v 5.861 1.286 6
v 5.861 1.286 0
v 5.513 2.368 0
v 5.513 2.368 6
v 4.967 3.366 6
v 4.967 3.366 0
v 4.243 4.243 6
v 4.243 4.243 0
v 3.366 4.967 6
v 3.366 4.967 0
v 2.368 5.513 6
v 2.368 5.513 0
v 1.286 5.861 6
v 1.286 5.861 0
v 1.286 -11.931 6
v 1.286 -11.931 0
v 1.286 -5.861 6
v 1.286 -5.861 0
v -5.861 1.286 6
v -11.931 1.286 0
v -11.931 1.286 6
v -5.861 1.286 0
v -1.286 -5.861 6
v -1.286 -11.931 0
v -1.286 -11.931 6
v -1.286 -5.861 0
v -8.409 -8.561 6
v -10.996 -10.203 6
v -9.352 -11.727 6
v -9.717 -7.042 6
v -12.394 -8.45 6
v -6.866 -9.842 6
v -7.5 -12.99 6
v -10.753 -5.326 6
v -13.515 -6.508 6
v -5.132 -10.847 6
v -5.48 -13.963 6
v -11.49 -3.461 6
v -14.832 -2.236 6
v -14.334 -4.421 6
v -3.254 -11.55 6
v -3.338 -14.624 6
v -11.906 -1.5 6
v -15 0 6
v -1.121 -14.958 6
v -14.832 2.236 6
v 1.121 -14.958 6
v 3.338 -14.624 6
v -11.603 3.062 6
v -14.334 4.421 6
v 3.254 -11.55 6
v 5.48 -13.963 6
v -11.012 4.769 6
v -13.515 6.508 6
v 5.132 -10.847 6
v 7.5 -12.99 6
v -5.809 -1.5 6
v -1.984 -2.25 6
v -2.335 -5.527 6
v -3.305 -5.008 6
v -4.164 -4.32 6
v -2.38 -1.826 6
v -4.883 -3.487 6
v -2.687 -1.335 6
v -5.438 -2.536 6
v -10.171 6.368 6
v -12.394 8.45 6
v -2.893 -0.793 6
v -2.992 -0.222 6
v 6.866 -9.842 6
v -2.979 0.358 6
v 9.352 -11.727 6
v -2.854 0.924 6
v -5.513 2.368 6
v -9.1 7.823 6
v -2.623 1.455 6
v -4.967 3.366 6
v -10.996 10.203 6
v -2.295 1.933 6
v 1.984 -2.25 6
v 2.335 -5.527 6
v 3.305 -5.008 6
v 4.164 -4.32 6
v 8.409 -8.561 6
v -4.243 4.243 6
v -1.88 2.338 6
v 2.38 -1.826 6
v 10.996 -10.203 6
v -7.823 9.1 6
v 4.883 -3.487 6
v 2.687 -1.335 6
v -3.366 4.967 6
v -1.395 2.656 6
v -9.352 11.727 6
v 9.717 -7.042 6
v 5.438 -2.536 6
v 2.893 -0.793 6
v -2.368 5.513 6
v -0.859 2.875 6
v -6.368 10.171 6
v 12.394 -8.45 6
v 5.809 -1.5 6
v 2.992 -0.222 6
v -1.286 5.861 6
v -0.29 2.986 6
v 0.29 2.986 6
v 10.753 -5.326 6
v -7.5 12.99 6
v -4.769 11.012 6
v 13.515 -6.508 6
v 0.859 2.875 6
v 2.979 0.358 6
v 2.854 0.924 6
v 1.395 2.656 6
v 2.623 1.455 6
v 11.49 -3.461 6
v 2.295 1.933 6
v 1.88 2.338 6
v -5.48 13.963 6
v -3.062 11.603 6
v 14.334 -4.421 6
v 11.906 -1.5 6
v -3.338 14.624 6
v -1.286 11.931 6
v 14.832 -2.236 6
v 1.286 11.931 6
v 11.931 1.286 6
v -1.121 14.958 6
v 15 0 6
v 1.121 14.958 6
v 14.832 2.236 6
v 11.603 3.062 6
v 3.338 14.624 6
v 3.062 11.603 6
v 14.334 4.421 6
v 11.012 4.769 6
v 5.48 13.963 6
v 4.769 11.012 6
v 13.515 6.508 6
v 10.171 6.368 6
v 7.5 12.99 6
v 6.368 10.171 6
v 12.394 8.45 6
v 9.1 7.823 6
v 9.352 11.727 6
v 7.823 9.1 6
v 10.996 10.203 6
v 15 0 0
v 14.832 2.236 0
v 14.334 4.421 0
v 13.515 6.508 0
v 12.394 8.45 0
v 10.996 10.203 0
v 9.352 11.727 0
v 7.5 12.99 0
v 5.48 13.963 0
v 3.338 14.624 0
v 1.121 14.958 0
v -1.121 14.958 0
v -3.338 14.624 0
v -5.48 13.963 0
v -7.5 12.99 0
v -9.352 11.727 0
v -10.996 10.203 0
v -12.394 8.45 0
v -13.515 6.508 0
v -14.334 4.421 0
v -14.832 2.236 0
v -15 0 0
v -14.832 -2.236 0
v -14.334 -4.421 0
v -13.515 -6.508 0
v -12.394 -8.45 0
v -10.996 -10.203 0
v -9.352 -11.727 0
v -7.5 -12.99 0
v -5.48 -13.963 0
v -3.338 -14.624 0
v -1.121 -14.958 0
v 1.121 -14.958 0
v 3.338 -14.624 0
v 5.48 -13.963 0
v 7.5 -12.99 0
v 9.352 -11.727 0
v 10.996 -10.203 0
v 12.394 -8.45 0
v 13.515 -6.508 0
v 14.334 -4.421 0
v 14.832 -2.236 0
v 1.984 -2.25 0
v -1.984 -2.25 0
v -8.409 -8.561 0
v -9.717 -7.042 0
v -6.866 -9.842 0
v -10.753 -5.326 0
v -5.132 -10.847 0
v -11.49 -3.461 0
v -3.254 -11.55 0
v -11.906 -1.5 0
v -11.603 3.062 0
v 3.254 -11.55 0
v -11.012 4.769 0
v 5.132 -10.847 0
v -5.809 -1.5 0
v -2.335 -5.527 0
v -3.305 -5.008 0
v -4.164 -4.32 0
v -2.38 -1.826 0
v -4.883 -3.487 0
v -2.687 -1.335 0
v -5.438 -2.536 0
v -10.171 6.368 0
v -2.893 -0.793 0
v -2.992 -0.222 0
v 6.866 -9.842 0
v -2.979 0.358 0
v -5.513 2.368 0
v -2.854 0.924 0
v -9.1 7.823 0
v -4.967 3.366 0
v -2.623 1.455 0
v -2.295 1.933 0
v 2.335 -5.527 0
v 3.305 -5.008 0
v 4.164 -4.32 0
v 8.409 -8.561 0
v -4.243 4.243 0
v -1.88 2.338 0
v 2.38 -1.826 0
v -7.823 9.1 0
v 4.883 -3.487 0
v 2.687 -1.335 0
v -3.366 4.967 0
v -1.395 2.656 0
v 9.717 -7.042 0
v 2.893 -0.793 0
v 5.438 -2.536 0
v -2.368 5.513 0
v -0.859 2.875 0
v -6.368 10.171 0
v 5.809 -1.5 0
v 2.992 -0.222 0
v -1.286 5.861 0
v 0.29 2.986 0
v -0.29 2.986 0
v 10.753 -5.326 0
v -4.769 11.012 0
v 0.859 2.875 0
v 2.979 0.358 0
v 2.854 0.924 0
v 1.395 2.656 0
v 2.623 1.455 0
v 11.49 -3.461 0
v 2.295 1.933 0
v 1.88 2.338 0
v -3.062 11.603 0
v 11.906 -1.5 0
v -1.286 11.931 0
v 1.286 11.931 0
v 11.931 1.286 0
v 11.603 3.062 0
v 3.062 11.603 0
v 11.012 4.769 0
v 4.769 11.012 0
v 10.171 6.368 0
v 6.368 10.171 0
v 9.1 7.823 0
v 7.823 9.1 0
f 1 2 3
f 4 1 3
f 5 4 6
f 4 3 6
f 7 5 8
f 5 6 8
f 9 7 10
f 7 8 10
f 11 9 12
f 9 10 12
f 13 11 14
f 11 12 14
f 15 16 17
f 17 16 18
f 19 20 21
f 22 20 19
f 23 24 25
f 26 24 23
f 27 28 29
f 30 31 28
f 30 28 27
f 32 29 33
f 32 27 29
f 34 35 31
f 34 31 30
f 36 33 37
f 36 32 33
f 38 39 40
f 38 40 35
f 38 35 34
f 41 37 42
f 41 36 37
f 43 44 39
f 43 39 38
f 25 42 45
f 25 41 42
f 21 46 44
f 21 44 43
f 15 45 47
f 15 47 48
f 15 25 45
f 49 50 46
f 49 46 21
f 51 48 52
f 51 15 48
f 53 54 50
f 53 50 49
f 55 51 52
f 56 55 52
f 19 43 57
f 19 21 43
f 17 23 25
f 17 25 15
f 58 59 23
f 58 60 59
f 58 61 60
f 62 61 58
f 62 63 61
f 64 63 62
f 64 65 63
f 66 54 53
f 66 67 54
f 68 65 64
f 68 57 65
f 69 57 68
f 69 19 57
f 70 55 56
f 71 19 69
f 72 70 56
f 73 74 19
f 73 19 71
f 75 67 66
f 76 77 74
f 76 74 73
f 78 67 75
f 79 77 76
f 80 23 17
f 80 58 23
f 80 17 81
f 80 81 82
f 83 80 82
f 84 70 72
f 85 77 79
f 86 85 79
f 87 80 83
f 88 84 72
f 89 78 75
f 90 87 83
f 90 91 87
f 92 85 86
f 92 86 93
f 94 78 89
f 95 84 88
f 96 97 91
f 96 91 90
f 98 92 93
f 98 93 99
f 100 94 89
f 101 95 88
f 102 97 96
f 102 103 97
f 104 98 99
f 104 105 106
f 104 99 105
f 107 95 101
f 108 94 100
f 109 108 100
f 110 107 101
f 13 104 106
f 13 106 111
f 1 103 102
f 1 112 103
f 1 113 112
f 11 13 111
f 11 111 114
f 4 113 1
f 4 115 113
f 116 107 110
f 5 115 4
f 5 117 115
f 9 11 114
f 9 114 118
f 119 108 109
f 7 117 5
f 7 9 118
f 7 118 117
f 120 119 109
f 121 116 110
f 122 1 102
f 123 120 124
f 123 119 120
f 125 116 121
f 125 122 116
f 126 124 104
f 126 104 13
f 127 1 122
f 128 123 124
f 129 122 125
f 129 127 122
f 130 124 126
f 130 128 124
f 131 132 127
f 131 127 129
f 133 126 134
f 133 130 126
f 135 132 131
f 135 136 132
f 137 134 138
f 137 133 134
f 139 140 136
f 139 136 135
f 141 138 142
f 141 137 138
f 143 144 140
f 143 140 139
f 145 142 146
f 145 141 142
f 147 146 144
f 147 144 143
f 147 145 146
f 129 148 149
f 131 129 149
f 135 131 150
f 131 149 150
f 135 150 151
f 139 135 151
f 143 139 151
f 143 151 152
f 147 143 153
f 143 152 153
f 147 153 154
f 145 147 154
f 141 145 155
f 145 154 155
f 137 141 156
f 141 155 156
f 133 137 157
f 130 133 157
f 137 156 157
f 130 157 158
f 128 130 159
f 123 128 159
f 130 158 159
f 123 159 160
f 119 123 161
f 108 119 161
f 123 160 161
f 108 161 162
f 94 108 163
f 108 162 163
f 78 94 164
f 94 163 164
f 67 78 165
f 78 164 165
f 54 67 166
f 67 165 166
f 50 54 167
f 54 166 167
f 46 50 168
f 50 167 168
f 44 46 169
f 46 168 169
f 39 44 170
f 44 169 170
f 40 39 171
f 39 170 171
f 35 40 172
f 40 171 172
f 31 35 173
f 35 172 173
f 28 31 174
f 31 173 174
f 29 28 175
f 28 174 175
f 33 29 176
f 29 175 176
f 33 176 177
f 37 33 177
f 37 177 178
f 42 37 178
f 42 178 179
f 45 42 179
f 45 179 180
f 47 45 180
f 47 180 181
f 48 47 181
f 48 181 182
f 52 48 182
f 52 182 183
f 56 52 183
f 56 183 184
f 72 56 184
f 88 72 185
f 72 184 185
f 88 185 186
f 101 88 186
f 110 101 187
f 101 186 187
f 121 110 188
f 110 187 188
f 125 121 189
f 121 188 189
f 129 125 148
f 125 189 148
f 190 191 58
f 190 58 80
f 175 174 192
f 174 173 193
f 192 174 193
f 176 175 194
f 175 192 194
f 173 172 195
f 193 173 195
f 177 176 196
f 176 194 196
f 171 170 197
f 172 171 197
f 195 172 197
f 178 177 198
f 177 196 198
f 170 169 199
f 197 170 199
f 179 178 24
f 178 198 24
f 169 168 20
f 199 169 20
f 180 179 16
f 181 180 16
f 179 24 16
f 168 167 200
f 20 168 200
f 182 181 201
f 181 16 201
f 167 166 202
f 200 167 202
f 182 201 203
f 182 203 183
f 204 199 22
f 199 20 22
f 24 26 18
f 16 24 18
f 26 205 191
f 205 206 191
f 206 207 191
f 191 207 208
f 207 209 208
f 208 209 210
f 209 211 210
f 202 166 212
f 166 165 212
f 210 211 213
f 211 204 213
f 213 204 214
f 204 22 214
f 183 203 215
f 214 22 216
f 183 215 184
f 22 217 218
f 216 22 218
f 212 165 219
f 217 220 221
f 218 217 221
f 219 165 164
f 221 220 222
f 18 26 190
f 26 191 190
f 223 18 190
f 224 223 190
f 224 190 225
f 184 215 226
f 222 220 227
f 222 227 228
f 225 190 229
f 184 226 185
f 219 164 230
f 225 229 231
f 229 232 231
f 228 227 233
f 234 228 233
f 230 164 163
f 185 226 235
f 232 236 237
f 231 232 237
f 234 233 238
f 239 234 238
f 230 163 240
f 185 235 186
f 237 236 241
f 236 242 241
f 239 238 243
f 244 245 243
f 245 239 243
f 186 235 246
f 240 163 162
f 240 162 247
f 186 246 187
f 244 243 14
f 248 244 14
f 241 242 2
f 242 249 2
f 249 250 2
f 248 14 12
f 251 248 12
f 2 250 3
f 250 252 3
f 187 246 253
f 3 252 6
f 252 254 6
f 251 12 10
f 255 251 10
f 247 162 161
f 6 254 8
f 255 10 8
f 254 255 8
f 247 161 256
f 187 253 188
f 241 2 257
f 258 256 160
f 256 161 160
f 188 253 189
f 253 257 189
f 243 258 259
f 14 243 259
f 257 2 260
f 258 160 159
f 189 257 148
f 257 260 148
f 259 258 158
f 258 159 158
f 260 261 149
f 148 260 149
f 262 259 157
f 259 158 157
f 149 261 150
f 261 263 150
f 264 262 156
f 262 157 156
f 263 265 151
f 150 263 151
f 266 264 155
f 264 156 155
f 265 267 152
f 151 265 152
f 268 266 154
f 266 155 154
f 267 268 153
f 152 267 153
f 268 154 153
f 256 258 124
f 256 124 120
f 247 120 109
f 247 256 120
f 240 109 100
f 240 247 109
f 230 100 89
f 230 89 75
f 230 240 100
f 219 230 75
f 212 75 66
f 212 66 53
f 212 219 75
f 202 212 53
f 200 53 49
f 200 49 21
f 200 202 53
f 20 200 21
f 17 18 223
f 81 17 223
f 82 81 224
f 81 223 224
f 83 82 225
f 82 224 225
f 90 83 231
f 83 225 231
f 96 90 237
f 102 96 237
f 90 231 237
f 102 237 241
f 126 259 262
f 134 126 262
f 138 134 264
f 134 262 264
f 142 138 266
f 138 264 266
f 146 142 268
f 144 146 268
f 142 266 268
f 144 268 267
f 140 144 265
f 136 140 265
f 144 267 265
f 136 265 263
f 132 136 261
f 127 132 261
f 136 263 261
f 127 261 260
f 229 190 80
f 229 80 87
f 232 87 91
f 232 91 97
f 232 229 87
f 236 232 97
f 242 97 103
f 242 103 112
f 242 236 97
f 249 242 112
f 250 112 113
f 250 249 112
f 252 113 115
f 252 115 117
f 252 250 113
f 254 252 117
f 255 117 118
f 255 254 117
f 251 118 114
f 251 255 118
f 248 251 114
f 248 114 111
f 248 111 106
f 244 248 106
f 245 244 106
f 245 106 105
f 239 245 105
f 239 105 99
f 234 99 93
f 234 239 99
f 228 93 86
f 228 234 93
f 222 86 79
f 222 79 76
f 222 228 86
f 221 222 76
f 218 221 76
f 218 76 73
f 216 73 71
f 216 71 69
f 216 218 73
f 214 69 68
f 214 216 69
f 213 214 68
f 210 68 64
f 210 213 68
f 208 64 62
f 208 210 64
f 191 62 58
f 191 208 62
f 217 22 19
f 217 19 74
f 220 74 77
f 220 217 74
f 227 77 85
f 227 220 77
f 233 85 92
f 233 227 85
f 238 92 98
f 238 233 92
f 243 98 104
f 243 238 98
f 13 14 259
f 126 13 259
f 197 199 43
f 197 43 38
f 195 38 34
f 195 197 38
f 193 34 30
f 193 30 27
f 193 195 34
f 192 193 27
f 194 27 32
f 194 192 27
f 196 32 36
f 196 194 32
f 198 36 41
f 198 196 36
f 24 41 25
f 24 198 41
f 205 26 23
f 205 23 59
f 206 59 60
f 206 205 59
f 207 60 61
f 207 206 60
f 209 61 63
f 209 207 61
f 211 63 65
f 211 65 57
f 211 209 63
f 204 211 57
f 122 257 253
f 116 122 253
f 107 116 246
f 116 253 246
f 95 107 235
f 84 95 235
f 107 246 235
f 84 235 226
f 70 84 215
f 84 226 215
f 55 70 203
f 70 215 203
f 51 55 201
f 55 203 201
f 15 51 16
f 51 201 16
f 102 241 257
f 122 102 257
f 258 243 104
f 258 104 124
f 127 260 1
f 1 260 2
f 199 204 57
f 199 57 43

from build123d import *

# Parameters (mm, degrees)
SKETCH1_R           = 15
BOSS_EXTRUDE1_DEPTH = 6


with BuildPart() as part:
    # Sketch1 → Boss-Extrude1 (new body)
    with BuildSketch(Plane.XY):
        Circle(SKETCH1_R)
        with BuildLine():
            Line((-1.285714286, 5.860626142), (-1.285714286, 11.930923635))
            ThreePointArc((-1.285714286, 11.930923635), (-8.485281374, 8.485281374), (-11.930923635, 1.285714286))
            Line((-11.930923635, 1.285714286), (-5.860626142, 1.285714286))
            ThreePointArc((-5.860626142, 1.285714286), (-4.242640687, 4.242640687), (-1.285714286, 5.860626142))
        make_face(mode=Mode.SUBTRACT)
        with BuildLine():
            Line((1.285714286, 5.860626142), (1.285714286, 11.930923635))
            ThreePointArc((1.285714286, 11.930923635), (8.485281374, 8.485281374), (11.930923635, 1.285714286))
            Line((11.930923635, 1.285714286), (5.860626142, 1.285714286))
            ThreePointArc((5.860626142, 1.285714286), (4.242640687, 4.242640687), (1.285714286, 5.860626142))
        make_face(mode=Mode.SUBTRACT)
        with BuildLine():
            Line((-1.285714286, -11.930923635), (-1.285714286, -5.860626142))
            ThreePointArc((-1.285714286, -5.860626142), (-4.164035651, -4.319815632), (-5.809475019, -1.5))
            Line((-5.809475019, -1.5), (-11.9058809, -1.5))
            ThreePointArc((-11.9058809, -1.5), (-8.408661478, -8.561215577), (-1.285714286, -11.930923635))
        make_face(mode=Mode.SUBTRACT)
        with BuildLine():
            Line((1.285714286, -11.930923635), (1.285714286, -5.860626142))
            ThreePointArc((1.285714286, -5.860626142), (4.164035651, -4.319815632), (5.809475019, -1.5))
            Line((5.809475019, -1.5), (11.9058809, -1.5))
            ThreePointArc((11.9058809, -1.5), (8.408661478, -8.561215577), (1.285714286, -11.930923635))
        make_face(mode=Mode.SUBTRACT)
        with BuildLine():
            Line((-1.984313483, -2.25), (1.984313483, -2.25))
            ThreePointArc((1.984313483, -2.25), (0, 3), (-1.984313483, -2.25))
        make_face(mode=Mode.SUBTRACT)
    extrude(amount=BOSS_EXTRUDE1_DEPTH)


solid = part.part
